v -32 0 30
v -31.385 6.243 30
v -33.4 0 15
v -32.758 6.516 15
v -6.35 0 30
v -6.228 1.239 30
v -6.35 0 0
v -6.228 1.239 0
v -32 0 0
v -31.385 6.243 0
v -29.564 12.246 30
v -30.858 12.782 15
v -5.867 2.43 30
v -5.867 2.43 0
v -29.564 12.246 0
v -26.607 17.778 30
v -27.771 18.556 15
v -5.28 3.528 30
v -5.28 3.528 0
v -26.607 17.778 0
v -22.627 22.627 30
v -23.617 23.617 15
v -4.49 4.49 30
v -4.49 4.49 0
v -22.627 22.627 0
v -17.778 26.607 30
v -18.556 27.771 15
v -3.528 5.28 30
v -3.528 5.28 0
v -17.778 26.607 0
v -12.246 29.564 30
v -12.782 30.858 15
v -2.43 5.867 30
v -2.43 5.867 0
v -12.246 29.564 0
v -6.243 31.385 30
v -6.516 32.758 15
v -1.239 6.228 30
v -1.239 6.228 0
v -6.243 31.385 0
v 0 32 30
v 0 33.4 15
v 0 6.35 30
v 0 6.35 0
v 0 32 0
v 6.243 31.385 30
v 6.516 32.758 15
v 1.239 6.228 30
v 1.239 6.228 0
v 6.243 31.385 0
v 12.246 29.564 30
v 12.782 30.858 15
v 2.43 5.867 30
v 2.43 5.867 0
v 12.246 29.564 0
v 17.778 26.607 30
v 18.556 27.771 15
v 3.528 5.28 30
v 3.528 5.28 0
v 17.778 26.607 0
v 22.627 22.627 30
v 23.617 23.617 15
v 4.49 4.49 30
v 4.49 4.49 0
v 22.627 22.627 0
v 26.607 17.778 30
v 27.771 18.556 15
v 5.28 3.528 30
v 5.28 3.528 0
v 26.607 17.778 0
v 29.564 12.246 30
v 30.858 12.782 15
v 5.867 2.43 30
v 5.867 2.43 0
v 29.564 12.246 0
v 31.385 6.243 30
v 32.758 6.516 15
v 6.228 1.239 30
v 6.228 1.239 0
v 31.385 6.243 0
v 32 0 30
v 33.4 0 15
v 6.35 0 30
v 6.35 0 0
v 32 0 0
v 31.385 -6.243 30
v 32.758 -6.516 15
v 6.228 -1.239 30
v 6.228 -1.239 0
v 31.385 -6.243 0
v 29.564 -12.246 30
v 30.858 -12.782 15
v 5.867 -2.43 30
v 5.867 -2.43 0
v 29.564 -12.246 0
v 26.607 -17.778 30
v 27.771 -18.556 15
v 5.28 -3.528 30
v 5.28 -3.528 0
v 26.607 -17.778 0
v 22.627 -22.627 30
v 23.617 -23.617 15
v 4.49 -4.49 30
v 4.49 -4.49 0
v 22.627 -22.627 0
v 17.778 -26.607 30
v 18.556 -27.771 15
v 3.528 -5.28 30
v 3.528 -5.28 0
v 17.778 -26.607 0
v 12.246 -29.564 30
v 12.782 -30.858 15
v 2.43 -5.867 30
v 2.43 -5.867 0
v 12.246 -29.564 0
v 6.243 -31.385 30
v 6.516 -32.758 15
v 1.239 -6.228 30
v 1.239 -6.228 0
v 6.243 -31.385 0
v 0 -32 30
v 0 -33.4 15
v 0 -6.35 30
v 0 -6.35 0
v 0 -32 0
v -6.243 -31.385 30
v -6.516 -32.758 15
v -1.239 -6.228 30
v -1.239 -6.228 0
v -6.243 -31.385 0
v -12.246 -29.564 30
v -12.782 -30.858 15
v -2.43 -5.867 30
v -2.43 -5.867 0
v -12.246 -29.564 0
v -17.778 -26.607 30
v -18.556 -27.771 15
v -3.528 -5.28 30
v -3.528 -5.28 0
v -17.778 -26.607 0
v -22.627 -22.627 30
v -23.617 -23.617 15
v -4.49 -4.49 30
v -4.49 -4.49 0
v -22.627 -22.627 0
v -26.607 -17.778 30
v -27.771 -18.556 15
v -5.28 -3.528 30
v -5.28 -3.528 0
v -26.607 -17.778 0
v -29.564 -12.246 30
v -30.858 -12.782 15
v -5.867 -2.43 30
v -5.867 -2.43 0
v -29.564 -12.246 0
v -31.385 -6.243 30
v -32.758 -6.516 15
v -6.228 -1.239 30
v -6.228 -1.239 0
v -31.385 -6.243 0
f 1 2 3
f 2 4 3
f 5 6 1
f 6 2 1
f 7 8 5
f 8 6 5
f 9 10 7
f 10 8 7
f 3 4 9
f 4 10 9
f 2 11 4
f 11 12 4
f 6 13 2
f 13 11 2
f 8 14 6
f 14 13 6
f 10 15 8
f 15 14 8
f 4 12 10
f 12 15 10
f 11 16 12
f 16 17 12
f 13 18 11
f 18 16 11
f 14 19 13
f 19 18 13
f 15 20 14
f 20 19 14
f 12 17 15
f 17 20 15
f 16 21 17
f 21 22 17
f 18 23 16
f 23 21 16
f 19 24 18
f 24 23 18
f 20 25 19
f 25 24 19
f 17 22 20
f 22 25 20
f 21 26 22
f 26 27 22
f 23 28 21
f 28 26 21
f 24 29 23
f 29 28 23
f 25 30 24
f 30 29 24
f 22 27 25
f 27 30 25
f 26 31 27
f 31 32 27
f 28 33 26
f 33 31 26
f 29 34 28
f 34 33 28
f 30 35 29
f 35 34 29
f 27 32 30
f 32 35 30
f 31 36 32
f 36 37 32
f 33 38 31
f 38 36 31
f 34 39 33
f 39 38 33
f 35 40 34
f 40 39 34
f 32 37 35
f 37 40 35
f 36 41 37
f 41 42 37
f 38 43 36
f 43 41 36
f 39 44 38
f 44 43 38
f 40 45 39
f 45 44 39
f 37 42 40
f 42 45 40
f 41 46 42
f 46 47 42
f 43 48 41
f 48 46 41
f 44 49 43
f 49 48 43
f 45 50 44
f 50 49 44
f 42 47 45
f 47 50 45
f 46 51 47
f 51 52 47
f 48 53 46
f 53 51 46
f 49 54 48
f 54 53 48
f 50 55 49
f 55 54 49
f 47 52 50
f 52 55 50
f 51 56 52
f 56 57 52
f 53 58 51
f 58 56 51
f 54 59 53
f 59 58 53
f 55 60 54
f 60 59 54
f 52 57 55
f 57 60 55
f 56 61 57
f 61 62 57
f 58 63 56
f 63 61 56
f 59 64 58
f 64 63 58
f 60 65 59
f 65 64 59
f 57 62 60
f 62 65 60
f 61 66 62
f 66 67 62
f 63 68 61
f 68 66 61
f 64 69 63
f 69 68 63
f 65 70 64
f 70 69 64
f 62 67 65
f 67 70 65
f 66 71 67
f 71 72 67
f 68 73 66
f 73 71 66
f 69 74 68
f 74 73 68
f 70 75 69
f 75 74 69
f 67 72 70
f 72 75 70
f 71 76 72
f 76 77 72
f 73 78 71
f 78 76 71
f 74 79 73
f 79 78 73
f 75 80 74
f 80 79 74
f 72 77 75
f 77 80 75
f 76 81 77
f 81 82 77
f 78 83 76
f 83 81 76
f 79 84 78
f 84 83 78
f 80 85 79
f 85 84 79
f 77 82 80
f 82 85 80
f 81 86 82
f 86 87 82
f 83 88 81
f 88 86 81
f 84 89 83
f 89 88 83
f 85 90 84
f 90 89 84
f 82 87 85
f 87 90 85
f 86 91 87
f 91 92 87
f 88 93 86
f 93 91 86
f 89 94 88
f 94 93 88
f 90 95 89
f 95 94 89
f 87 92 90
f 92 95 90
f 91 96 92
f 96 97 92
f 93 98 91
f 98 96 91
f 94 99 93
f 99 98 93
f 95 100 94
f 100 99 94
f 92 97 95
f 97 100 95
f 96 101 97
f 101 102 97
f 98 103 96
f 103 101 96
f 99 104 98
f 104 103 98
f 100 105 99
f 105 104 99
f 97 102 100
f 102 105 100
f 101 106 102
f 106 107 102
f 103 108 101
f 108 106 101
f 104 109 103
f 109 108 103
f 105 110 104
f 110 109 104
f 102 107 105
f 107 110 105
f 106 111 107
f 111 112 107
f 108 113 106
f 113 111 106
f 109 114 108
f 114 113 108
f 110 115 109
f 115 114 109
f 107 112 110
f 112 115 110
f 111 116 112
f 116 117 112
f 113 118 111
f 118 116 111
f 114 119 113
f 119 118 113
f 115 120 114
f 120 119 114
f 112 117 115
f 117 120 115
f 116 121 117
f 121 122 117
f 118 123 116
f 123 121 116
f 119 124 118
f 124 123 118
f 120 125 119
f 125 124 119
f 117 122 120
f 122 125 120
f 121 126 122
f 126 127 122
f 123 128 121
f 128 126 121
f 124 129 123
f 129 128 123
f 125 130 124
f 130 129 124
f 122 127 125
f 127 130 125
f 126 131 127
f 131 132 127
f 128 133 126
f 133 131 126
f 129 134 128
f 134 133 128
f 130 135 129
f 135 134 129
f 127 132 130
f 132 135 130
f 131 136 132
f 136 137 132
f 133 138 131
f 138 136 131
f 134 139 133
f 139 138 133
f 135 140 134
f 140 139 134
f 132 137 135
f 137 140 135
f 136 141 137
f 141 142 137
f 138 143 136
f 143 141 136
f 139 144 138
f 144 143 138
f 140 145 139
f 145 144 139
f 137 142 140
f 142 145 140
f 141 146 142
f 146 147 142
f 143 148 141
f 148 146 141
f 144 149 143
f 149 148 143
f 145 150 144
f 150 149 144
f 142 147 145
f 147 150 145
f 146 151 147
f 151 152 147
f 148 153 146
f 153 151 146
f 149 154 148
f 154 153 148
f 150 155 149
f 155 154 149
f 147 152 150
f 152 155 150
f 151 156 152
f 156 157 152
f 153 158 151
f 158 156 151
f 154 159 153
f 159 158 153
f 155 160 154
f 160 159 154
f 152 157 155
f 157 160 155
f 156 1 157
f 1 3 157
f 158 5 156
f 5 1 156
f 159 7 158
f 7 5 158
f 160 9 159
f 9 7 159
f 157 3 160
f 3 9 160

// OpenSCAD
$fn = 32;

// ----------------------------------------------------------------------
// Belt roller: 64 mm barrel, 30 mm wide, bore 12.7 mm
// ----------------------------------------------------------------------

// --- parameters (mm) ---
bore_d = 12.7;            // bore
barrel_d = 64;            // barrel diameter
roller_w = 30;            // roller width
crown = 1.4;              // crown height at mid width

roller_profile = [[6.35, 0], [32, 0], [33.4, 15], [32, 30], [6.35, 30]];

/* the profile stays clear of the axis, so the bore comes out of the revolve */
rotate_extrude() polygon(roller_profile);
